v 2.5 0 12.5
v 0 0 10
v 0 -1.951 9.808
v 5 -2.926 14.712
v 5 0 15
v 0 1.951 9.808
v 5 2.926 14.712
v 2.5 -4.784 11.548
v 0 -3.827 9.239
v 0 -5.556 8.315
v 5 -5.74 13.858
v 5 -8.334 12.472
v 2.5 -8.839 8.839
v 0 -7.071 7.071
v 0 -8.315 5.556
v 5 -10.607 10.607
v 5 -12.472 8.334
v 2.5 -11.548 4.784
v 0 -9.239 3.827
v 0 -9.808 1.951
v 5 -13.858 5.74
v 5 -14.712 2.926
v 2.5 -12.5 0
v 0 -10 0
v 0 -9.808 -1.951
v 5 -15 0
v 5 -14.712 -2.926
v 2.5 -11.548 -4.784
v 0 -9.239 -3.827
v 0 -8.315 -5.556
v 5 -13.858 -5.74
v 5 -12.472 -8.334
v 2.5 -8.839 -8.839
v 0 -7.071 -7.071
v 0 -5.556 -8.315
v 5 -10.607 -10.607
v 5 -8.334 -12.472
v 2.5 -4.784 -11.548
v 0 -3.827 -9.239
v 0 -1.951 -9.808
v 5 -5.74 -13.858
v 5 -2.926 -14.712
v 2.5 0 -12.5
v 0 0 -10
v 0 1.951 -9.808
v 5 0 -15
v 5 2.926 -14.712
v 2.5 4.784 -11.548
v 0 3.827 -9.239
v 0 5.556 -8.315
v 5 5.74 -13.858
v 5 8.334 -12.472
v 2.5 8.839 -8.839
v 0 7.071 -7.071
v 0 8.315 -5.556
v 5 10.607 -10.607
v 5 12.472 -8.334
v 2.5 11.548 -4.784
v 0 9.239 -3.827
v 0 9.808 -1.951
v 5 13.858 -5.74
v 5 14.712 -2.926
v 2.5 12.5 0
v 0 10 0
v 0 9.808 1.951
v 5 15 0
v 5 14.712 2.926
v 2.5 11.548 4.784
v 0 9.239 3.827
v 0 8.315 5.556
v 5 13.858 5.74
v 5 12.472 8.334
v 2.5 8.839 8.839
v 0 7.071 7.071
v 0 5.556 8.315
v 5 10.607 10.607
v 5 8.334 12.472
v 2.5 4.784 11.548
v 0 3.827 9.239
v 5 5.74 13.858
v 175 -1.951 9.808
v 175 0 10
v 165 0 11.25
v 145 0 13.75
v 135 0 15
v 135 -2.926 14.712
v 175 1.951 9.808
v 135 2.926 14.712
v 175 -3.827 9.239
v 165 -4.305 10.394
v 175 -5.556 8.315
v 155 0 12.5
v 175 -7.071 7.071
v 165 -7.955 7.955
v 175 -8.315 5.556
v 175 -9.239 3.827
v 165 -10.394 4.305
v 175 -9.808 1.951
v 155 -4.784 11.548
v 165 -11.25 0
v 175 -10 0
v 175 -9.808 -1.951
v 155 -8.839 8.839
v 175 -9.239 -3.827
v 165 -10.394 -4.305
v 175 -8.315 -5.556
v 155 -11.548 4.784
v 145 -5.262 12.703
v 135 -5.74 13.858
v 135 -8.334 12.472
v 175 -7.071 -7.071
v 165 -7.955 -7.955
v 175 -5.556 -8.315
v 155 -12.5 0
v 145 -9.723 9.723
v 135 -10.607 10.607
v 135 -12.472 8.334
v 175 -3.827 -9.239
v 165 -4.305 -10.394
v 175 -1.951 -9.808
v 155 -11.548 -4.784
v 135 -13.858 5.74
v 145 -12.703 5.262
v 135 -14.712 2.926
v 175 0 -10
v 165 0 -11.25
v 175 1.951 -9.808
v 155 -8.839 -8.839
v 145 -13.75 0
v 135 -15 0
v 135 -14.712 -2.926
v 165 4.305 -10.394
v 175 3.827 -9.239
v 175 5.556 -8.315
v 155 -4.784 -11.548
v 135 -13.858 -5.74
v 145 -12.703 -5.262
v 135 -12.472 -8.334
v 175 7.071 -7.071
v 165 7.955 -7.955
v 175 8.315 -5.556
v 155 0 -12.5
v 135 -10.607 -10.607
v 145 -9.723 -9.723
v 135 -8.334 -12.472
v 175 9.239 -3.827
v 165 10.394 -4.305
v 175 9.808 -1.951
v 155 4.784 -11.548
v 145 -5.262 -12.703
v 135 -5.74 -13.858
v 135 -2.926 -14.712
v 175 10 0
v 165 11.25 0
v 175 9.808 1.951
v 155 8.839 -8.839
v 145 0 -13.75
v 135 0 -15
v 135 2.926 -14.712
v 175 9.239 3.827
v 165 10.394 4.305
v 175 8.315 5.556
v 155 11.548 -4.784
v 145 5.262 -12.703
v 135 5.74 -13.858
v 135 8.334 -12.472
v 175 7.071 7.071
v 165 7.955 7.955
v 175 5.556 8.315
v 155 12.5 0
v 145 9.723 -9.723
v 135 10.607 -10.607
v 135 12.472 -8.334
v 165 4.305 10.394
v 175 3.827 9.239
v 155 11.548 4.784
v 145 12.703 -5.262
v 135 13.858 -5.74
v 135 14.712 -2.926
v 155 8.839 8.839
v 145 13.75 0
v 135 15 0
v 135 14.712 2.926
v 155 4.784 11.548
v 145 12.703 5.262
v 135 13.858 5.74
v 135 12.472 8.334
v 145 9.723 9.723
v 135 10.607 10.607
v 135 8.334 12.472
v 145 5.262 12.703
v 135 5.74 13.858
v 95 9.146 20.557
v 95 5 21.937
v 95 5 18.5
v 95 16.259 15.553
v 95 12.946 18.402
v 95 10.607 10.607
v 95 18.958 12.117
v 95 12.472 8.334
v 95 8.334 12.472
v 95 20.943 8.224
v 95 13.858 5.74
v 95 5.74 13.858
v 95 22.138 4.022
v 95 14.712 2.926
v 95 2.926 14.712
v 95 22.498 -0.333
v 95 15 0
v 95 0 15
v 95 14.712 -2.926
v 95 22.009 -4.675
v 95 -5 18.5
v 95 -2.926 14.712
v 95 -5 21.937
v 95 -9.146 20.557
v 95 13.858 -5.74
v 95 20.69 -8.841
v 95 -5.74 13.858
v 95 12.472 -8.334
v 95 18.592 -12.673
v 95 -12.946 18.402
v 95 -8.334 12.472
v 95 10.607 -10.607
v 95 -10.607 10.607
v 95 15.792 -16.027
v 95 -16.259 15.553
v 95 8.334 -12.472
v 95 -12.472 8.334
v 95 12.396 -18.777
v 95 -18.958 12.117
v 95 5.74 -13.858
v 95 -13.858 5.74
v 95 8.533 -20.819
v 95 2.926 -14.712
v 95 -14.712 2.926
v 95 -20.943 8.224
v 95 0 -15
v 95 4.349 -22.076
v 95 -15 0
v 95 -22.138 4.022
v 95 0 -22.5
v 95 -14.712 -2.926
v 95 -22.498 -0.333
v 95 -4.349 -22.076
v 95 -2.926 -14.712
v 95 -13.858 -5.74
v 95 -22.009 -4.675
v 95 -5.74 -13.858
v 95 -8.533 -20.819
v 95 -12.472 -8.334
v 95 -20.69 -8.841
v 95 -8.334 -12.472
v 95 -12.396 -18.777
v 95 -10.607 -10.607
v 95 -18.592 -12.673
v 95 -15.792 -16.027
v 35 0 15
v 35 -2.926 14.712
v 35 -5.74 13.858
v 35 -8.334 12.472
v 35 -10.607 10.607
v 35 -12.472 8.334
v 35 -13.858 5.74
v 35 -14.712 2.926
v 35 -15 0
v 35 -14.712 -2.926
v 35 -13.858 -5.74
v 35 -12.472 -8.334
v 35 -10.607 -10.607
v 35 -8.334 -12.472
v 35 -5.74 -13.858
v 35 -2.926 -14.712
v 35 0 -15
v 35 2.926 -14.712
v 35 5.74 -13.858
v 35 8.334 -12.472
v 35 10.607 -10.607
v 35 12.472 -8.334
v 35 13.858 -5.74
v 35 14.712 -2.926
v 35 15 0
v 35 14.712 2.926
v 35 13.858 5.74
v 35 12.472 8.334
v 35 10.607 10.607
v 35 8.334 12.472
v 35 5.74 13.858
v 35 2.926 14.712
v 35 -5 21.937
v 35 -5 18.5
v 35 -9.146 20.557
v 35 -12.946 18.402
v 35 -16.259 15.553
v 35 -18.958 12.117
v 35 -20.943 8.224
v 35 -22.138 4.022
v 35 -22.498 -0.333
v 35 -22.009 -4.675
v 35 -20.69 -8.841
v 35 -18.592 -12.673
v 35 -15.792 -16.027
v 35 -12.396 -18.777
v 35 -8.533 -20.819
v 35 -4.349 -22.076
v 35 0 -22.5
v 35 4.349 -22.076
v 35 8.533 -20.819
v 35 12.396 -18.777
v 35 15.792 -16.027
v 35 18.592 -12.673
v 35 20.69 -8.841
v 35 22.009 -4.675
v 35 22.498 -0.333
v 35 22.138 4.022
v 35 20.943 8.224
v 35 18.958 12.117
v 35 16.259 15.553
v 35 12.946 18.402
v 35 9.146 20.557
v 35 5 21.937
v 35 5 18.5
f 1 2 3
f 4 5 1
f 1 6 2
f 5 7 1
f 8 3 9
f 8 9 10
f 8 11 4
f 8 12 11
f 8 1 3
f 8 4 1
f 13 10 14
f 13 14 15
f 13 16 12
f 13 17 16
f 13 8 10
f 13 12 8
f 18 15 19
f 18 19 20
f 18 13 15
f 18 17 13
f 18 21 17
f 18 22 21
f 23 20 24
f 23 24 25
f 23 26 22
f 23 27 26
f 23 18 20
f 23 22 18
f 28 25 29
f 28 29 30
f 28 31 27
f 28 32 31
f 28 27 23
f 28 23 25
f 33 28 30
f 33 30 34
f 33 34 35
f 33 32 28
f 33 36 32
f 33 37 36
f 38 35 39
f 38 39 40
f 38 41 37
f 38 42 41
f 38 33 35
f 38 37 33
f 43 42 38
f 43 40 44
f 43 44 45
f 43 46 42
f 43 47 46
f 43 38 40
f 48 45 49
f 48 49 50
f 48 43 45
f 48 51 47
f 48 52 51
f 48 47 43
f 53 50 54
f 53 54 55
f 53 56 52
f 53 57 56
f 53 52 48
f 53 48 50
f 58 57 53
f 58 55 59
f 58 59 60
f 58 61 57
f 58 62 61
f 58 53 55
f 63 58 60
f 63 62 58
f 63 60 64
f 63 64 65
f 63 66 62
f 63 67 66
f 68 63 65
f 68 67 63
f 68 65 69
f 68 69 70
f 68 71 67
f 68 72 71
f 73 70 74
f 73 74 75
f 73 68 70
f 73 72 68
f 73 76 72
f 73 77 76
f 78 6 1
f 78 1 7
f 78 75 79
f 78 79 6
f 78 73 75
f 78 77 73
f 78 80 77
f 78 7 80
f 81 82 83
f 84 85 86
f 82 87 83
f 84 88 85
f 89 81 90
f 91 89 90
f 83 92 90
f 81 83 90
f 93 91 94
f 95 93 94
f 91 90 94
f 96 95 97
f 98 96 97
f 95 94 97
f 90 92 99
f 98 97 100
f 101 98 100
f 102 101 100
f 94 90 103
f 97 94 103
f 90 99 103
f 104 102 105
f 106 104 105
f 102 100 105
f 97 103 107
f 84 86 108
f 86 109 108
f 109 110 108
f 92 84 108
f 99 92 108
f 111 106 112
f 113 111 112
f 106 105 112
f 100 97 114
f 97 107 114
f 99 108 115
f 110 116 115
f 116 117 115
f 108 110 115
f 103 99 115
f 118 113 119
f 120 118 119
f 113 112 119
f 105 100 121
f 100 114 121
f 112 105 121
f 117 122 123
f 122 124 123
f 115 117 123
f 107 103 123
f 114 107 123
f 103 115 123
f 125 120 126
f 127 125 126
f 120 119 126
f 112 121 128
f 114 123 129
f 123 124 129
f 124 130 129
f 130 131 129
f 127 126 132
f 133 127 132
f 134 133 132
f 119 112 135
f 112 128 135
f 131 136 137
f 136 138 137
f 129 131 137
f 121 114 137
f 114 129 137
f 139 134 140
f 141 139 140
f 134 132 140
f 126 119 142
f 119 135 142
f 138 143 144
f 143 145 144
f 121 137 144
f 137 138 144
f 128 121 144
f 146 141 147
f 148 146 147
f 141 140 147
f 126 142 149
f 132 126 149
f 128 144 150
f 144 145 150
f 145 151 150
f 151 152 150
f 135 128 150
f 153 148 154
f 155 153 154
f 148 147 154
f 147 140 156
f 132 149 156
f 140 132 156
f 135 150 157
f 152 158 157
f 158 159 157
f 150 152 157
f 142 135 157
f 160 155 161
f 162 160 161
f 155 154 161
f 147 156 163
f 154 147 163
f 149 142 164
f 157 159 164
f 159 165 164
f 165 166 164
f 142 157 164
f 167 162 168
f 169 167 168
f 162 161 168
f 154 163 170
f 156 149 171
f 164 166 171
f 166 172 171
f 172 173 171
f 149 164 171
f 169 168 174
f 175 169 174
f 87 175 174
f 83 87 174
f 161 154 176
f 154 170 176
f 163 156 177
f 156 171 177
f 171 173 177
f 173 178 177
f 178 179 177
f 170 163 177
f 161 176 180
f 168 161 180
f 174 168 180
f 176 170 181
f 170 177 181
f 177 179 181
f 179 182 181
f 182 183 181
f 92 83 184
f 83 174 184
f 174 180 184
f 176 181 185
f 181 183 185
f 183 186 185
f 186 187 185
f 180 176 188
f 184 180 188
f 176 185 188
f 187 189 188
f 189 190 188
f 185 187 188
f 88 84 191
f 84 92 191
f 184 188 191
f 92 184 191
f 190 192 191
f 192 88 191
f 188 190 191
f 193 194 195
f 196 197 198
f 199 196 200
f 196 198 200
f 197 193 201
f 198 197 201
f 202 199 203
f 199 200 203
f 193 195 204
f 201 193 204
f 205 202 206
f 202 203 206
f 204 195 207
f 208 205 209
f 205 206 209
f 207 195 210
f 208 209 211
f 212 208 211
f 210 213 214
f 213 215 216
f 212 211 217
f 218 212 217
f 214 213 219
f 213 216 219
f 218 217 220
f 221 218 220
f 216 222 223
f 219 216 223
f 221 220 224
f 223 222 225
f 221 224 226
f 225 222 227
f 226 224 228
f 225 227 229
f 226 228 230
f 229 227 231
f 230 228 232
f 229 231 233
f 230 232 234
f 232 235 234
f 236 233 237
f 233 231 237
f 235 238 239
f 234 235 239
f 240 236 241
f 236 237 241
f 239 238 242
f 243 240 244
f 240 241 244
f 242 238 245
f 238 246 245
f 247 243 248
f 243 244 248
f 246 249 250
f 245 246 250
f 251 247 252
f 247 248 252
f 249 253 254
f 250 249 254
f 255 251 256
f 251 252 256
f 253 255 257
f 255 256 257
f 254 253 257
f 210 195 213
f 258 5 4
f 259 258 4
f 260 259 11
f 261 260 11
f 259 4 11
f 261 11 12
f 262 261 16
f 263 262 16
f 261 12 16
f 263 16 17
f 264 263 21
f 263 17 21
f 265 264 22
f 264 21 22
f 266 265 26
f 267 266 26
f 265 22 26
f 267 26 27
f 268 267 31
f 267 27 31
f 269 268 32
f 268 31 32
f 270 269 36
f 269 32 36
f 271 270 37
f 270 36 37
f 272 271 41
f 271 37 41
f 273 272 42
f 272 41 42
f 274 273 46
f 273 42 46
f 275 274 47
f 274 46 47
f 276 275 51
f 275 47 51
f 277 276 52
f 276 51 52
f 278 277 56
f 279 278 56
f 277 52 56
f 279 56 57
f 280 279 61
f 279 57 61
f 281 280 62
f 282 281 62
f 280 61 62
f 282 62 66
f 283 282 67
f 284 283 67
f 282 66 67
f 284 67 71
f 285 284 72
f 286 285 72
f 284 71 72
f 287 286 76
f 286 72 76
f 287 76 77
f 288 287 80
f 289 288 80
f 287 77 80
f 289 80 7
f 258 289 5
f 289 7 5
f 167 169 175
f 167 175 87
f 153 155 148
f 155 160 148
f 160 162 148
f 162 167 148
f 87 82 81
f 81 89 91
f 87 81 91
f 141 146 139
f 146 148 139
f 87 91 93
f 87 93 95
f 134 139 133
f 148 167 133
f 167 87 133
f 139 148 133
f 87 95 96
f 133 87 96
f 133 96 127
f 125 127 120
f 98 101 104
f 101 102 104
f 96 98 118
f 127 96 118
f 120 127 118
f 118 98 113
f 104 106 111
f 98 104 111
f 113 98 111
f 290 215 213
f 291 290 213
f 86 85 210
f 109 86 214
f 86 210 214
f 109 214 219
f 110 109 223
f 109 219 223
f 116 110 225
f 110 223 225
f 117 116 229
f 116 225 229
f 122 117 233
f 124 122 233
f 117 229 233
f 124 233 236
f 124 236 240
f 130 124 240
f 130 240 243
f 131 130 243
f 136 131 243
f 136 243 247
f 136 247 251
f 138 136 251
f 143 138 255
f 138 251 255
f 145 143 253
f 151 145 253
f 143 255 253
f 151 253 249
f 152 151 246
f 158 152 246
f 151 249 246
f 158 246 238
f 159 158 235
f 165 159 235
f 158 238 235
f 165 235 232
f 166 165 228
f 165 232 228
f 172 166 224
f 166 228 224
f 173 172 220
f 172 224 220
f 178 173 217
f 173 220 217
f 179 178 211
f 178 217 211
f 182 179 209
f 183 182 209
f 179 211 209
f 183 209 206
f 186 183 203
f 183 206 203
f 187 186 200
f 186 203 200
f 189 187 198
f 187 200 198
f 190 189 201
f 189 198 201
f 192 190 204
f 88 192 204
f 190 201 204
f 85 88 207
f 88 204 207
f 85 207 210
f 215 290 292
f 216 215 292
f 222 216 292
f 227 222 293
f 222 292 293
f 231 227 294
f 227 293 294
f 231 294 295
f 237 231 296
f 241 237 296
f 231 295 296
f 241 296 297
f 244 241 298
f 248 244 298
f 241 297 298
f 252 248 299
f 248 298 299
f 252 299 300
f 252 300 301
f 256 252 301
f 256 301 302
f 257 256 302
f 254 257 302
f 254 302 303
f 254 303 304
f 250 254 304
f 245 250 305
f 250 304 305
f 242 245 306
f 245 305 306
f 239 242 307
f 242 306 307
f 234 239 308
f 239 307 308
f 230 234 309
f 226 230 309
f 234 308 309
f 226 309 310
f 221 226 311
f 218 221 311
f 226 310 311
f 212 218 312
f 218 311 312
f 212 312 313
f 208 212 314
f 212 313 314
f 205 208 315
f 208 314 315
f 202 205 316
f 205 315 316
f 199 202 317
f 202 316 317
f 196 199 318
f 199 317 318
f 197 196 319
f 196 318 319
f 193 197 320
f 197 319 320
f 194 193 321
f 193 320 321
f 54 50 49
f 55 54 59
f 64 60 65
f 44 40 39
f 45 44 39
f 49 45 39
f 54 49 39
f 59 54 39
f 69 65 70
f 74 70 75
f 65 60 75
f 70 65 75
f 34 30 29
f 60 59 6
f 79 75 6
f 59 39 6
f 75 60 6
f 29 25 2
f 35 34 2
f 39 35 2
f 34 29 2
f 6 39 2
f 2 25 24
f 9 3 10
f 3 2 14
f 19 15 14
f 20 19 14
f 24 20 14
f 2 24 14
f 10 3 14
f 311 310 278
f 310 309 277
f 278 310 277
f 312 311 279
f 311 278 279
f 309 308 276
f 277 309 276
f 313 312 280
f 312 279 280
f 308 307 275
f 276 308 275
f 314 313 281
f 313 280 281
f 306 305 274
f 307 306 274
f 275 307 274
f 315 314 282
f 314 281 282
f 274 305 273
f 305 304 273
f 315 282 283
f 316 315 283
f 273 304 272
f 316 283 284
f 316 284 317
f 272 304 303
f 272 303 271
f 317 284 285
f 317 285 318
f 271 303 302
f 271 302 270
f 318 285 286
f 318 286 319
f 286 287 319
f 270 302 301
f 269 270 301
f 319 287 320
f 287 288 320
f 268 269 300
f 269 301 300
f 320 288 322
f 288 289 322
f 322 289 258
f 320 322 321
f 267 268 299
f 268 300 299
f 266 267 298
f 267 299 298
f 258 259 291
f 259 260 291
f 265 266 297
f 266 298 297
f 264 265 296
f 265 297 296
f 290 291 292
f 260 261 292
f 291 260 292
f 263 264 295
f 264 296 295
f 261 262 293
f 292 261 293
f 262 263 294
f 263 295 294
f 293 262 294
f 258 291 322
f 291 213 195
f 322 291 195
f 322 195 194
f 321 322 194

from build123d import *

# Parameters (mm, degrees)
F4_DEPTH = 60


with BuildPart() as f2:
    # F0 (on Front) → F2 (revolve)
    with BuildSketch(Plane.XZ):
        Polygon((0, 15), (0, 0), (175, 0), (175, 10), (135, 15), (95, 15), (95, 22.5), (35, 22.5), (35, 15), align=None)
    revolve(axis=Axis((109.590694, 0, 0), (1, 0, 0)))

    # F3 (on face) → F4 (cut, through all)
    with BuildSketch(Plane.YZ.offset(95)):
        with BuildLine():
            ThreePointArc((5, 21.937411), (2.515776, 22.35891), (0, 22.5))
            ThreePointArc((0, 22.5), (-2.515776, 22.35891), (-5, 21.937411))
            Line((-5, 21.937411), (-5, 18.5))
            Line((-5, 18.5), (5, 18.5))
            Line((5, 18.5), (5, 21.937411))
        make_face()
    extrude(amount=-F4_DEPTH, mode=Mode.SUBTRACT)

    # F5 (on Front) → F6 (revolve, cut)
    with BuildSketch(Plane.XZ):
        Polygon((5, 15), (0, 15), (0, 10), align=None)
    revolve(axis=Axis((109.590694, 0, 0), (1, 0, 0)), mode=Mode.SUBTRACT)


solid = f2.part
